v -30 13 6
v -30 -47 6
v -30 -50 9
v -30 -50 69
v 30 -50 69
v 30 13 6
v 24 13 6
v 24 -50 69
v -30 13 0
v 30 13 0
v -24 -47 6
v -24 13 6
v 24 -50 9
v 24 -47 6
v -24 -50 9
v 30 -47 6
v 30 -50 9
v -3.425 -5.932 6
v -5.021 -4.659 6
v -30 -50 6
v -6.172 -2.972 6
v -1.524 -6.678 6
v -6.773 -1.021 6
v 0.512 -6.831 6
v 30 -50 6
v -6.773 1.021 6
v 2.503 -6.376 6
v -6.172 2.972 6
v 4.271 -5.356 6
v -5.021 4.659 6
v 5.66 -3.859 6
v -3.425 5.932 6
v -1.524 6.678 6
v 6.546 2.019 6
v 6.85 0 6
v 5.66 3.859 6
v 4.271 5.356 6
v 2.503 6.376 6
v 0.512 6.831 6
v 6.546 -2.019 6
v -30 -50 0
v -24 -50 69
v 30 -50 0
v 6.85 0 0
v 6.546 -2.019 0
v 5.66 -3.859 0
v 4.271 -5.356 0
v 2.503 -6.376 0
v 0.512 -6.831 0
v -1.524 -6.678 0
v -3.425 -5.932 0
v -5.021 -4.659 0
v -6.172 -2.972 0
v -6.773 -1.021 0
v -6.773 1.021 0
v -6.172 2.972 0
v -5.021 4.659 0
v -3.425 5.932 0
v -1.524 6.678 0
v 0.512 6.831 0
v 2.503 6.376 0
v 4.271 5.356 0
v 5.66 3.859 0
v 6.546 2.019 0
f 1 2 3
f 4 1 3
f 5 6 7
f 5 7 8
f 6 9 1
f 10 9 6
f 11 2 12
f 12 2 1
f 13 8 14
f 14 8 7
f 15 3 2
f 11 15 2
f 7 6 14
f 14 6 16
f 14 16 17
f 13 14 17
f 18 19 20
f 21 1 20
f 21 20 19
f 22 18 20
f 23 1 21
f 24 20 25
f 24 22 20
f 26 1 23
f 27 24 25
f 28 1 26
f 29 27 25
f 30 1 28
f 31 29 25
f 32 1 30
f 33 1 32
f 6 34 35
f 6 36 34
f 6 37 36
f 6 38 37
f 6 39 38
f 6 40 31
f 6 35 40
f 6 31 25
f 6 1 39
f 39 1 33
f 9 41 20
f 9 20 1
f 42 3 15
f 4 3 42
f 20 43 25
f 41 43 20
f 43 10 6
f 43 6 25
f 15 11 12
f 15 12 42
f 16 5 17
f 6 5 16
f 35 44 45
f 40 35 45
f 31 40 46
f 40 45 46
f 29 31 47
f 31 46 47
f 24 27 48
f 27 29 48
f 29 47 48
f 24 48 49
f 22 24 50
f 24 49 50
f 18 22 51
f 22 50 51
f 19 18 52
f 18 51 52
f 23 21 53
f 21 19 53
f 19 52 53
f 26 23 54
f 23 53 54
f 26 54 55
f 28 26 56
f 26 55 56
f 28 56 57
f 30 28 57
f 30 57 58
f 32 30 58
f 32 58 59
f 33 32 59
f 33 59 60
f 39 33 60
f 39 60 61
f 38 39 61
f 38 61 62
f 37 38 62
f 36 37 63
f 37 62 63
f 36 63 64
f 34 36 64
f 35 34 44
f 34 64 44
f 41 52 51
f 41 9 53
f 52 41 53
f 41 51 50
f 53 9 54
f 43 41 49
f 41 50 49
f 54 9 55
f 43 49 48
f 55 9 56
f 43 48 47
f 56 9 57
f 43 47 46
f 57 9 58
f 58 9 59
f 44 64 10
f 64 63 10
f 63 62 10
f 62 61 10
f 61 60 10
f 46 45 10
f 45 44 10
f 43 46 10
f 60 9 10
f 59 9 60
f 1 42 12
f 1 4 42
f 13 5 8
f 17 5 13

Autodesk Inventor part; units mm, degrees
ref_plane "YZ Plane" through (0, 0, 0) normal (1, 0, 0) x (0, 1, 0)
ref_plane "XZ Plane" through (0, 0, 0) normal (0, 1, 0) x (-1, 0, 0)
ref_plane "XY Plane" through (0, 0, 0) normal (0, 0, 1) x (1, 0, 0)
sketch "Sketch1" plane through (0, 0, 0) normal (0, 0, 1) x (1, 0, 0)
  circle A0 centre (0, 0) radius 6.85
  line L0 (-30, 13) -> (30, 13)
  line L1 (30, 13) -> (30, -50)
  line L2 (30, -50) -> (-30, -50)
  line L3 (-30, -50) -> (-30, 13)
  point P0 (0, 13)
  dimension "d0" = 13.7
  dimension "d1" = 50
  dimension "d2" = 60
  dimension "d4" = 13
extrude "Plate1" add sketch "Sketch1" along normal blind 6
sketch "Sketch2" plane through (30, -50, 0) normal (1, 0, 0) x (0, 0, -1)
  line L0 (-6, 63) -> (-6, 0)
  line L1 (0, 0) -> (-6, 0)
  line L2 (0, 63) -> (0, 0)
  line L3 (0, 63) -> (-6, 63)
  line L4 (-6, 63) -> (-69, 0)
  line L5 (-69, 0) -> (-9, 0)
  line L6 (-6, 0) -> (-6, 63)
  line L7 (-6, 63) -> (-6, 3)
  line L8 (-6, 3) -> (-9, 0)
  point P0 (0, 50)
  dimension "d5" = 45
  dimension "d7" = 3
  dimension "d8" = 3
extrude "Plate2" add sketch "Sketch2" against normal blind 6 separate body contours L0 L8 L5 L4
mirror "Mirror1" about plane through (0, 0, 0) normal (1, 0, 0) bodies 2
equation "\"d8\" = d7"
equation "\"d3\" = Thickness"
equation "\"d6\" = Thickness"
equation "\"BendRadius\" = Thickness"
equation "\"BendReliefWidth\" = Thickness"
equation "\"BendReliefDepth\" = 0.5 * Thickness"
equation "\"CornerReliefSize\" = 4 * Thickness"
equation "\"MinimumRemnant\" = 2 * Thickness"
equation "\"TransitionRadius\" = BendRadius"
equation "\"JacobiRadiusSize\" = BendRadius"
equation "\"GapSize\" = Thickness"
equation "\"Thickness\" = 6"
properties part number "Break_tensor_support"
